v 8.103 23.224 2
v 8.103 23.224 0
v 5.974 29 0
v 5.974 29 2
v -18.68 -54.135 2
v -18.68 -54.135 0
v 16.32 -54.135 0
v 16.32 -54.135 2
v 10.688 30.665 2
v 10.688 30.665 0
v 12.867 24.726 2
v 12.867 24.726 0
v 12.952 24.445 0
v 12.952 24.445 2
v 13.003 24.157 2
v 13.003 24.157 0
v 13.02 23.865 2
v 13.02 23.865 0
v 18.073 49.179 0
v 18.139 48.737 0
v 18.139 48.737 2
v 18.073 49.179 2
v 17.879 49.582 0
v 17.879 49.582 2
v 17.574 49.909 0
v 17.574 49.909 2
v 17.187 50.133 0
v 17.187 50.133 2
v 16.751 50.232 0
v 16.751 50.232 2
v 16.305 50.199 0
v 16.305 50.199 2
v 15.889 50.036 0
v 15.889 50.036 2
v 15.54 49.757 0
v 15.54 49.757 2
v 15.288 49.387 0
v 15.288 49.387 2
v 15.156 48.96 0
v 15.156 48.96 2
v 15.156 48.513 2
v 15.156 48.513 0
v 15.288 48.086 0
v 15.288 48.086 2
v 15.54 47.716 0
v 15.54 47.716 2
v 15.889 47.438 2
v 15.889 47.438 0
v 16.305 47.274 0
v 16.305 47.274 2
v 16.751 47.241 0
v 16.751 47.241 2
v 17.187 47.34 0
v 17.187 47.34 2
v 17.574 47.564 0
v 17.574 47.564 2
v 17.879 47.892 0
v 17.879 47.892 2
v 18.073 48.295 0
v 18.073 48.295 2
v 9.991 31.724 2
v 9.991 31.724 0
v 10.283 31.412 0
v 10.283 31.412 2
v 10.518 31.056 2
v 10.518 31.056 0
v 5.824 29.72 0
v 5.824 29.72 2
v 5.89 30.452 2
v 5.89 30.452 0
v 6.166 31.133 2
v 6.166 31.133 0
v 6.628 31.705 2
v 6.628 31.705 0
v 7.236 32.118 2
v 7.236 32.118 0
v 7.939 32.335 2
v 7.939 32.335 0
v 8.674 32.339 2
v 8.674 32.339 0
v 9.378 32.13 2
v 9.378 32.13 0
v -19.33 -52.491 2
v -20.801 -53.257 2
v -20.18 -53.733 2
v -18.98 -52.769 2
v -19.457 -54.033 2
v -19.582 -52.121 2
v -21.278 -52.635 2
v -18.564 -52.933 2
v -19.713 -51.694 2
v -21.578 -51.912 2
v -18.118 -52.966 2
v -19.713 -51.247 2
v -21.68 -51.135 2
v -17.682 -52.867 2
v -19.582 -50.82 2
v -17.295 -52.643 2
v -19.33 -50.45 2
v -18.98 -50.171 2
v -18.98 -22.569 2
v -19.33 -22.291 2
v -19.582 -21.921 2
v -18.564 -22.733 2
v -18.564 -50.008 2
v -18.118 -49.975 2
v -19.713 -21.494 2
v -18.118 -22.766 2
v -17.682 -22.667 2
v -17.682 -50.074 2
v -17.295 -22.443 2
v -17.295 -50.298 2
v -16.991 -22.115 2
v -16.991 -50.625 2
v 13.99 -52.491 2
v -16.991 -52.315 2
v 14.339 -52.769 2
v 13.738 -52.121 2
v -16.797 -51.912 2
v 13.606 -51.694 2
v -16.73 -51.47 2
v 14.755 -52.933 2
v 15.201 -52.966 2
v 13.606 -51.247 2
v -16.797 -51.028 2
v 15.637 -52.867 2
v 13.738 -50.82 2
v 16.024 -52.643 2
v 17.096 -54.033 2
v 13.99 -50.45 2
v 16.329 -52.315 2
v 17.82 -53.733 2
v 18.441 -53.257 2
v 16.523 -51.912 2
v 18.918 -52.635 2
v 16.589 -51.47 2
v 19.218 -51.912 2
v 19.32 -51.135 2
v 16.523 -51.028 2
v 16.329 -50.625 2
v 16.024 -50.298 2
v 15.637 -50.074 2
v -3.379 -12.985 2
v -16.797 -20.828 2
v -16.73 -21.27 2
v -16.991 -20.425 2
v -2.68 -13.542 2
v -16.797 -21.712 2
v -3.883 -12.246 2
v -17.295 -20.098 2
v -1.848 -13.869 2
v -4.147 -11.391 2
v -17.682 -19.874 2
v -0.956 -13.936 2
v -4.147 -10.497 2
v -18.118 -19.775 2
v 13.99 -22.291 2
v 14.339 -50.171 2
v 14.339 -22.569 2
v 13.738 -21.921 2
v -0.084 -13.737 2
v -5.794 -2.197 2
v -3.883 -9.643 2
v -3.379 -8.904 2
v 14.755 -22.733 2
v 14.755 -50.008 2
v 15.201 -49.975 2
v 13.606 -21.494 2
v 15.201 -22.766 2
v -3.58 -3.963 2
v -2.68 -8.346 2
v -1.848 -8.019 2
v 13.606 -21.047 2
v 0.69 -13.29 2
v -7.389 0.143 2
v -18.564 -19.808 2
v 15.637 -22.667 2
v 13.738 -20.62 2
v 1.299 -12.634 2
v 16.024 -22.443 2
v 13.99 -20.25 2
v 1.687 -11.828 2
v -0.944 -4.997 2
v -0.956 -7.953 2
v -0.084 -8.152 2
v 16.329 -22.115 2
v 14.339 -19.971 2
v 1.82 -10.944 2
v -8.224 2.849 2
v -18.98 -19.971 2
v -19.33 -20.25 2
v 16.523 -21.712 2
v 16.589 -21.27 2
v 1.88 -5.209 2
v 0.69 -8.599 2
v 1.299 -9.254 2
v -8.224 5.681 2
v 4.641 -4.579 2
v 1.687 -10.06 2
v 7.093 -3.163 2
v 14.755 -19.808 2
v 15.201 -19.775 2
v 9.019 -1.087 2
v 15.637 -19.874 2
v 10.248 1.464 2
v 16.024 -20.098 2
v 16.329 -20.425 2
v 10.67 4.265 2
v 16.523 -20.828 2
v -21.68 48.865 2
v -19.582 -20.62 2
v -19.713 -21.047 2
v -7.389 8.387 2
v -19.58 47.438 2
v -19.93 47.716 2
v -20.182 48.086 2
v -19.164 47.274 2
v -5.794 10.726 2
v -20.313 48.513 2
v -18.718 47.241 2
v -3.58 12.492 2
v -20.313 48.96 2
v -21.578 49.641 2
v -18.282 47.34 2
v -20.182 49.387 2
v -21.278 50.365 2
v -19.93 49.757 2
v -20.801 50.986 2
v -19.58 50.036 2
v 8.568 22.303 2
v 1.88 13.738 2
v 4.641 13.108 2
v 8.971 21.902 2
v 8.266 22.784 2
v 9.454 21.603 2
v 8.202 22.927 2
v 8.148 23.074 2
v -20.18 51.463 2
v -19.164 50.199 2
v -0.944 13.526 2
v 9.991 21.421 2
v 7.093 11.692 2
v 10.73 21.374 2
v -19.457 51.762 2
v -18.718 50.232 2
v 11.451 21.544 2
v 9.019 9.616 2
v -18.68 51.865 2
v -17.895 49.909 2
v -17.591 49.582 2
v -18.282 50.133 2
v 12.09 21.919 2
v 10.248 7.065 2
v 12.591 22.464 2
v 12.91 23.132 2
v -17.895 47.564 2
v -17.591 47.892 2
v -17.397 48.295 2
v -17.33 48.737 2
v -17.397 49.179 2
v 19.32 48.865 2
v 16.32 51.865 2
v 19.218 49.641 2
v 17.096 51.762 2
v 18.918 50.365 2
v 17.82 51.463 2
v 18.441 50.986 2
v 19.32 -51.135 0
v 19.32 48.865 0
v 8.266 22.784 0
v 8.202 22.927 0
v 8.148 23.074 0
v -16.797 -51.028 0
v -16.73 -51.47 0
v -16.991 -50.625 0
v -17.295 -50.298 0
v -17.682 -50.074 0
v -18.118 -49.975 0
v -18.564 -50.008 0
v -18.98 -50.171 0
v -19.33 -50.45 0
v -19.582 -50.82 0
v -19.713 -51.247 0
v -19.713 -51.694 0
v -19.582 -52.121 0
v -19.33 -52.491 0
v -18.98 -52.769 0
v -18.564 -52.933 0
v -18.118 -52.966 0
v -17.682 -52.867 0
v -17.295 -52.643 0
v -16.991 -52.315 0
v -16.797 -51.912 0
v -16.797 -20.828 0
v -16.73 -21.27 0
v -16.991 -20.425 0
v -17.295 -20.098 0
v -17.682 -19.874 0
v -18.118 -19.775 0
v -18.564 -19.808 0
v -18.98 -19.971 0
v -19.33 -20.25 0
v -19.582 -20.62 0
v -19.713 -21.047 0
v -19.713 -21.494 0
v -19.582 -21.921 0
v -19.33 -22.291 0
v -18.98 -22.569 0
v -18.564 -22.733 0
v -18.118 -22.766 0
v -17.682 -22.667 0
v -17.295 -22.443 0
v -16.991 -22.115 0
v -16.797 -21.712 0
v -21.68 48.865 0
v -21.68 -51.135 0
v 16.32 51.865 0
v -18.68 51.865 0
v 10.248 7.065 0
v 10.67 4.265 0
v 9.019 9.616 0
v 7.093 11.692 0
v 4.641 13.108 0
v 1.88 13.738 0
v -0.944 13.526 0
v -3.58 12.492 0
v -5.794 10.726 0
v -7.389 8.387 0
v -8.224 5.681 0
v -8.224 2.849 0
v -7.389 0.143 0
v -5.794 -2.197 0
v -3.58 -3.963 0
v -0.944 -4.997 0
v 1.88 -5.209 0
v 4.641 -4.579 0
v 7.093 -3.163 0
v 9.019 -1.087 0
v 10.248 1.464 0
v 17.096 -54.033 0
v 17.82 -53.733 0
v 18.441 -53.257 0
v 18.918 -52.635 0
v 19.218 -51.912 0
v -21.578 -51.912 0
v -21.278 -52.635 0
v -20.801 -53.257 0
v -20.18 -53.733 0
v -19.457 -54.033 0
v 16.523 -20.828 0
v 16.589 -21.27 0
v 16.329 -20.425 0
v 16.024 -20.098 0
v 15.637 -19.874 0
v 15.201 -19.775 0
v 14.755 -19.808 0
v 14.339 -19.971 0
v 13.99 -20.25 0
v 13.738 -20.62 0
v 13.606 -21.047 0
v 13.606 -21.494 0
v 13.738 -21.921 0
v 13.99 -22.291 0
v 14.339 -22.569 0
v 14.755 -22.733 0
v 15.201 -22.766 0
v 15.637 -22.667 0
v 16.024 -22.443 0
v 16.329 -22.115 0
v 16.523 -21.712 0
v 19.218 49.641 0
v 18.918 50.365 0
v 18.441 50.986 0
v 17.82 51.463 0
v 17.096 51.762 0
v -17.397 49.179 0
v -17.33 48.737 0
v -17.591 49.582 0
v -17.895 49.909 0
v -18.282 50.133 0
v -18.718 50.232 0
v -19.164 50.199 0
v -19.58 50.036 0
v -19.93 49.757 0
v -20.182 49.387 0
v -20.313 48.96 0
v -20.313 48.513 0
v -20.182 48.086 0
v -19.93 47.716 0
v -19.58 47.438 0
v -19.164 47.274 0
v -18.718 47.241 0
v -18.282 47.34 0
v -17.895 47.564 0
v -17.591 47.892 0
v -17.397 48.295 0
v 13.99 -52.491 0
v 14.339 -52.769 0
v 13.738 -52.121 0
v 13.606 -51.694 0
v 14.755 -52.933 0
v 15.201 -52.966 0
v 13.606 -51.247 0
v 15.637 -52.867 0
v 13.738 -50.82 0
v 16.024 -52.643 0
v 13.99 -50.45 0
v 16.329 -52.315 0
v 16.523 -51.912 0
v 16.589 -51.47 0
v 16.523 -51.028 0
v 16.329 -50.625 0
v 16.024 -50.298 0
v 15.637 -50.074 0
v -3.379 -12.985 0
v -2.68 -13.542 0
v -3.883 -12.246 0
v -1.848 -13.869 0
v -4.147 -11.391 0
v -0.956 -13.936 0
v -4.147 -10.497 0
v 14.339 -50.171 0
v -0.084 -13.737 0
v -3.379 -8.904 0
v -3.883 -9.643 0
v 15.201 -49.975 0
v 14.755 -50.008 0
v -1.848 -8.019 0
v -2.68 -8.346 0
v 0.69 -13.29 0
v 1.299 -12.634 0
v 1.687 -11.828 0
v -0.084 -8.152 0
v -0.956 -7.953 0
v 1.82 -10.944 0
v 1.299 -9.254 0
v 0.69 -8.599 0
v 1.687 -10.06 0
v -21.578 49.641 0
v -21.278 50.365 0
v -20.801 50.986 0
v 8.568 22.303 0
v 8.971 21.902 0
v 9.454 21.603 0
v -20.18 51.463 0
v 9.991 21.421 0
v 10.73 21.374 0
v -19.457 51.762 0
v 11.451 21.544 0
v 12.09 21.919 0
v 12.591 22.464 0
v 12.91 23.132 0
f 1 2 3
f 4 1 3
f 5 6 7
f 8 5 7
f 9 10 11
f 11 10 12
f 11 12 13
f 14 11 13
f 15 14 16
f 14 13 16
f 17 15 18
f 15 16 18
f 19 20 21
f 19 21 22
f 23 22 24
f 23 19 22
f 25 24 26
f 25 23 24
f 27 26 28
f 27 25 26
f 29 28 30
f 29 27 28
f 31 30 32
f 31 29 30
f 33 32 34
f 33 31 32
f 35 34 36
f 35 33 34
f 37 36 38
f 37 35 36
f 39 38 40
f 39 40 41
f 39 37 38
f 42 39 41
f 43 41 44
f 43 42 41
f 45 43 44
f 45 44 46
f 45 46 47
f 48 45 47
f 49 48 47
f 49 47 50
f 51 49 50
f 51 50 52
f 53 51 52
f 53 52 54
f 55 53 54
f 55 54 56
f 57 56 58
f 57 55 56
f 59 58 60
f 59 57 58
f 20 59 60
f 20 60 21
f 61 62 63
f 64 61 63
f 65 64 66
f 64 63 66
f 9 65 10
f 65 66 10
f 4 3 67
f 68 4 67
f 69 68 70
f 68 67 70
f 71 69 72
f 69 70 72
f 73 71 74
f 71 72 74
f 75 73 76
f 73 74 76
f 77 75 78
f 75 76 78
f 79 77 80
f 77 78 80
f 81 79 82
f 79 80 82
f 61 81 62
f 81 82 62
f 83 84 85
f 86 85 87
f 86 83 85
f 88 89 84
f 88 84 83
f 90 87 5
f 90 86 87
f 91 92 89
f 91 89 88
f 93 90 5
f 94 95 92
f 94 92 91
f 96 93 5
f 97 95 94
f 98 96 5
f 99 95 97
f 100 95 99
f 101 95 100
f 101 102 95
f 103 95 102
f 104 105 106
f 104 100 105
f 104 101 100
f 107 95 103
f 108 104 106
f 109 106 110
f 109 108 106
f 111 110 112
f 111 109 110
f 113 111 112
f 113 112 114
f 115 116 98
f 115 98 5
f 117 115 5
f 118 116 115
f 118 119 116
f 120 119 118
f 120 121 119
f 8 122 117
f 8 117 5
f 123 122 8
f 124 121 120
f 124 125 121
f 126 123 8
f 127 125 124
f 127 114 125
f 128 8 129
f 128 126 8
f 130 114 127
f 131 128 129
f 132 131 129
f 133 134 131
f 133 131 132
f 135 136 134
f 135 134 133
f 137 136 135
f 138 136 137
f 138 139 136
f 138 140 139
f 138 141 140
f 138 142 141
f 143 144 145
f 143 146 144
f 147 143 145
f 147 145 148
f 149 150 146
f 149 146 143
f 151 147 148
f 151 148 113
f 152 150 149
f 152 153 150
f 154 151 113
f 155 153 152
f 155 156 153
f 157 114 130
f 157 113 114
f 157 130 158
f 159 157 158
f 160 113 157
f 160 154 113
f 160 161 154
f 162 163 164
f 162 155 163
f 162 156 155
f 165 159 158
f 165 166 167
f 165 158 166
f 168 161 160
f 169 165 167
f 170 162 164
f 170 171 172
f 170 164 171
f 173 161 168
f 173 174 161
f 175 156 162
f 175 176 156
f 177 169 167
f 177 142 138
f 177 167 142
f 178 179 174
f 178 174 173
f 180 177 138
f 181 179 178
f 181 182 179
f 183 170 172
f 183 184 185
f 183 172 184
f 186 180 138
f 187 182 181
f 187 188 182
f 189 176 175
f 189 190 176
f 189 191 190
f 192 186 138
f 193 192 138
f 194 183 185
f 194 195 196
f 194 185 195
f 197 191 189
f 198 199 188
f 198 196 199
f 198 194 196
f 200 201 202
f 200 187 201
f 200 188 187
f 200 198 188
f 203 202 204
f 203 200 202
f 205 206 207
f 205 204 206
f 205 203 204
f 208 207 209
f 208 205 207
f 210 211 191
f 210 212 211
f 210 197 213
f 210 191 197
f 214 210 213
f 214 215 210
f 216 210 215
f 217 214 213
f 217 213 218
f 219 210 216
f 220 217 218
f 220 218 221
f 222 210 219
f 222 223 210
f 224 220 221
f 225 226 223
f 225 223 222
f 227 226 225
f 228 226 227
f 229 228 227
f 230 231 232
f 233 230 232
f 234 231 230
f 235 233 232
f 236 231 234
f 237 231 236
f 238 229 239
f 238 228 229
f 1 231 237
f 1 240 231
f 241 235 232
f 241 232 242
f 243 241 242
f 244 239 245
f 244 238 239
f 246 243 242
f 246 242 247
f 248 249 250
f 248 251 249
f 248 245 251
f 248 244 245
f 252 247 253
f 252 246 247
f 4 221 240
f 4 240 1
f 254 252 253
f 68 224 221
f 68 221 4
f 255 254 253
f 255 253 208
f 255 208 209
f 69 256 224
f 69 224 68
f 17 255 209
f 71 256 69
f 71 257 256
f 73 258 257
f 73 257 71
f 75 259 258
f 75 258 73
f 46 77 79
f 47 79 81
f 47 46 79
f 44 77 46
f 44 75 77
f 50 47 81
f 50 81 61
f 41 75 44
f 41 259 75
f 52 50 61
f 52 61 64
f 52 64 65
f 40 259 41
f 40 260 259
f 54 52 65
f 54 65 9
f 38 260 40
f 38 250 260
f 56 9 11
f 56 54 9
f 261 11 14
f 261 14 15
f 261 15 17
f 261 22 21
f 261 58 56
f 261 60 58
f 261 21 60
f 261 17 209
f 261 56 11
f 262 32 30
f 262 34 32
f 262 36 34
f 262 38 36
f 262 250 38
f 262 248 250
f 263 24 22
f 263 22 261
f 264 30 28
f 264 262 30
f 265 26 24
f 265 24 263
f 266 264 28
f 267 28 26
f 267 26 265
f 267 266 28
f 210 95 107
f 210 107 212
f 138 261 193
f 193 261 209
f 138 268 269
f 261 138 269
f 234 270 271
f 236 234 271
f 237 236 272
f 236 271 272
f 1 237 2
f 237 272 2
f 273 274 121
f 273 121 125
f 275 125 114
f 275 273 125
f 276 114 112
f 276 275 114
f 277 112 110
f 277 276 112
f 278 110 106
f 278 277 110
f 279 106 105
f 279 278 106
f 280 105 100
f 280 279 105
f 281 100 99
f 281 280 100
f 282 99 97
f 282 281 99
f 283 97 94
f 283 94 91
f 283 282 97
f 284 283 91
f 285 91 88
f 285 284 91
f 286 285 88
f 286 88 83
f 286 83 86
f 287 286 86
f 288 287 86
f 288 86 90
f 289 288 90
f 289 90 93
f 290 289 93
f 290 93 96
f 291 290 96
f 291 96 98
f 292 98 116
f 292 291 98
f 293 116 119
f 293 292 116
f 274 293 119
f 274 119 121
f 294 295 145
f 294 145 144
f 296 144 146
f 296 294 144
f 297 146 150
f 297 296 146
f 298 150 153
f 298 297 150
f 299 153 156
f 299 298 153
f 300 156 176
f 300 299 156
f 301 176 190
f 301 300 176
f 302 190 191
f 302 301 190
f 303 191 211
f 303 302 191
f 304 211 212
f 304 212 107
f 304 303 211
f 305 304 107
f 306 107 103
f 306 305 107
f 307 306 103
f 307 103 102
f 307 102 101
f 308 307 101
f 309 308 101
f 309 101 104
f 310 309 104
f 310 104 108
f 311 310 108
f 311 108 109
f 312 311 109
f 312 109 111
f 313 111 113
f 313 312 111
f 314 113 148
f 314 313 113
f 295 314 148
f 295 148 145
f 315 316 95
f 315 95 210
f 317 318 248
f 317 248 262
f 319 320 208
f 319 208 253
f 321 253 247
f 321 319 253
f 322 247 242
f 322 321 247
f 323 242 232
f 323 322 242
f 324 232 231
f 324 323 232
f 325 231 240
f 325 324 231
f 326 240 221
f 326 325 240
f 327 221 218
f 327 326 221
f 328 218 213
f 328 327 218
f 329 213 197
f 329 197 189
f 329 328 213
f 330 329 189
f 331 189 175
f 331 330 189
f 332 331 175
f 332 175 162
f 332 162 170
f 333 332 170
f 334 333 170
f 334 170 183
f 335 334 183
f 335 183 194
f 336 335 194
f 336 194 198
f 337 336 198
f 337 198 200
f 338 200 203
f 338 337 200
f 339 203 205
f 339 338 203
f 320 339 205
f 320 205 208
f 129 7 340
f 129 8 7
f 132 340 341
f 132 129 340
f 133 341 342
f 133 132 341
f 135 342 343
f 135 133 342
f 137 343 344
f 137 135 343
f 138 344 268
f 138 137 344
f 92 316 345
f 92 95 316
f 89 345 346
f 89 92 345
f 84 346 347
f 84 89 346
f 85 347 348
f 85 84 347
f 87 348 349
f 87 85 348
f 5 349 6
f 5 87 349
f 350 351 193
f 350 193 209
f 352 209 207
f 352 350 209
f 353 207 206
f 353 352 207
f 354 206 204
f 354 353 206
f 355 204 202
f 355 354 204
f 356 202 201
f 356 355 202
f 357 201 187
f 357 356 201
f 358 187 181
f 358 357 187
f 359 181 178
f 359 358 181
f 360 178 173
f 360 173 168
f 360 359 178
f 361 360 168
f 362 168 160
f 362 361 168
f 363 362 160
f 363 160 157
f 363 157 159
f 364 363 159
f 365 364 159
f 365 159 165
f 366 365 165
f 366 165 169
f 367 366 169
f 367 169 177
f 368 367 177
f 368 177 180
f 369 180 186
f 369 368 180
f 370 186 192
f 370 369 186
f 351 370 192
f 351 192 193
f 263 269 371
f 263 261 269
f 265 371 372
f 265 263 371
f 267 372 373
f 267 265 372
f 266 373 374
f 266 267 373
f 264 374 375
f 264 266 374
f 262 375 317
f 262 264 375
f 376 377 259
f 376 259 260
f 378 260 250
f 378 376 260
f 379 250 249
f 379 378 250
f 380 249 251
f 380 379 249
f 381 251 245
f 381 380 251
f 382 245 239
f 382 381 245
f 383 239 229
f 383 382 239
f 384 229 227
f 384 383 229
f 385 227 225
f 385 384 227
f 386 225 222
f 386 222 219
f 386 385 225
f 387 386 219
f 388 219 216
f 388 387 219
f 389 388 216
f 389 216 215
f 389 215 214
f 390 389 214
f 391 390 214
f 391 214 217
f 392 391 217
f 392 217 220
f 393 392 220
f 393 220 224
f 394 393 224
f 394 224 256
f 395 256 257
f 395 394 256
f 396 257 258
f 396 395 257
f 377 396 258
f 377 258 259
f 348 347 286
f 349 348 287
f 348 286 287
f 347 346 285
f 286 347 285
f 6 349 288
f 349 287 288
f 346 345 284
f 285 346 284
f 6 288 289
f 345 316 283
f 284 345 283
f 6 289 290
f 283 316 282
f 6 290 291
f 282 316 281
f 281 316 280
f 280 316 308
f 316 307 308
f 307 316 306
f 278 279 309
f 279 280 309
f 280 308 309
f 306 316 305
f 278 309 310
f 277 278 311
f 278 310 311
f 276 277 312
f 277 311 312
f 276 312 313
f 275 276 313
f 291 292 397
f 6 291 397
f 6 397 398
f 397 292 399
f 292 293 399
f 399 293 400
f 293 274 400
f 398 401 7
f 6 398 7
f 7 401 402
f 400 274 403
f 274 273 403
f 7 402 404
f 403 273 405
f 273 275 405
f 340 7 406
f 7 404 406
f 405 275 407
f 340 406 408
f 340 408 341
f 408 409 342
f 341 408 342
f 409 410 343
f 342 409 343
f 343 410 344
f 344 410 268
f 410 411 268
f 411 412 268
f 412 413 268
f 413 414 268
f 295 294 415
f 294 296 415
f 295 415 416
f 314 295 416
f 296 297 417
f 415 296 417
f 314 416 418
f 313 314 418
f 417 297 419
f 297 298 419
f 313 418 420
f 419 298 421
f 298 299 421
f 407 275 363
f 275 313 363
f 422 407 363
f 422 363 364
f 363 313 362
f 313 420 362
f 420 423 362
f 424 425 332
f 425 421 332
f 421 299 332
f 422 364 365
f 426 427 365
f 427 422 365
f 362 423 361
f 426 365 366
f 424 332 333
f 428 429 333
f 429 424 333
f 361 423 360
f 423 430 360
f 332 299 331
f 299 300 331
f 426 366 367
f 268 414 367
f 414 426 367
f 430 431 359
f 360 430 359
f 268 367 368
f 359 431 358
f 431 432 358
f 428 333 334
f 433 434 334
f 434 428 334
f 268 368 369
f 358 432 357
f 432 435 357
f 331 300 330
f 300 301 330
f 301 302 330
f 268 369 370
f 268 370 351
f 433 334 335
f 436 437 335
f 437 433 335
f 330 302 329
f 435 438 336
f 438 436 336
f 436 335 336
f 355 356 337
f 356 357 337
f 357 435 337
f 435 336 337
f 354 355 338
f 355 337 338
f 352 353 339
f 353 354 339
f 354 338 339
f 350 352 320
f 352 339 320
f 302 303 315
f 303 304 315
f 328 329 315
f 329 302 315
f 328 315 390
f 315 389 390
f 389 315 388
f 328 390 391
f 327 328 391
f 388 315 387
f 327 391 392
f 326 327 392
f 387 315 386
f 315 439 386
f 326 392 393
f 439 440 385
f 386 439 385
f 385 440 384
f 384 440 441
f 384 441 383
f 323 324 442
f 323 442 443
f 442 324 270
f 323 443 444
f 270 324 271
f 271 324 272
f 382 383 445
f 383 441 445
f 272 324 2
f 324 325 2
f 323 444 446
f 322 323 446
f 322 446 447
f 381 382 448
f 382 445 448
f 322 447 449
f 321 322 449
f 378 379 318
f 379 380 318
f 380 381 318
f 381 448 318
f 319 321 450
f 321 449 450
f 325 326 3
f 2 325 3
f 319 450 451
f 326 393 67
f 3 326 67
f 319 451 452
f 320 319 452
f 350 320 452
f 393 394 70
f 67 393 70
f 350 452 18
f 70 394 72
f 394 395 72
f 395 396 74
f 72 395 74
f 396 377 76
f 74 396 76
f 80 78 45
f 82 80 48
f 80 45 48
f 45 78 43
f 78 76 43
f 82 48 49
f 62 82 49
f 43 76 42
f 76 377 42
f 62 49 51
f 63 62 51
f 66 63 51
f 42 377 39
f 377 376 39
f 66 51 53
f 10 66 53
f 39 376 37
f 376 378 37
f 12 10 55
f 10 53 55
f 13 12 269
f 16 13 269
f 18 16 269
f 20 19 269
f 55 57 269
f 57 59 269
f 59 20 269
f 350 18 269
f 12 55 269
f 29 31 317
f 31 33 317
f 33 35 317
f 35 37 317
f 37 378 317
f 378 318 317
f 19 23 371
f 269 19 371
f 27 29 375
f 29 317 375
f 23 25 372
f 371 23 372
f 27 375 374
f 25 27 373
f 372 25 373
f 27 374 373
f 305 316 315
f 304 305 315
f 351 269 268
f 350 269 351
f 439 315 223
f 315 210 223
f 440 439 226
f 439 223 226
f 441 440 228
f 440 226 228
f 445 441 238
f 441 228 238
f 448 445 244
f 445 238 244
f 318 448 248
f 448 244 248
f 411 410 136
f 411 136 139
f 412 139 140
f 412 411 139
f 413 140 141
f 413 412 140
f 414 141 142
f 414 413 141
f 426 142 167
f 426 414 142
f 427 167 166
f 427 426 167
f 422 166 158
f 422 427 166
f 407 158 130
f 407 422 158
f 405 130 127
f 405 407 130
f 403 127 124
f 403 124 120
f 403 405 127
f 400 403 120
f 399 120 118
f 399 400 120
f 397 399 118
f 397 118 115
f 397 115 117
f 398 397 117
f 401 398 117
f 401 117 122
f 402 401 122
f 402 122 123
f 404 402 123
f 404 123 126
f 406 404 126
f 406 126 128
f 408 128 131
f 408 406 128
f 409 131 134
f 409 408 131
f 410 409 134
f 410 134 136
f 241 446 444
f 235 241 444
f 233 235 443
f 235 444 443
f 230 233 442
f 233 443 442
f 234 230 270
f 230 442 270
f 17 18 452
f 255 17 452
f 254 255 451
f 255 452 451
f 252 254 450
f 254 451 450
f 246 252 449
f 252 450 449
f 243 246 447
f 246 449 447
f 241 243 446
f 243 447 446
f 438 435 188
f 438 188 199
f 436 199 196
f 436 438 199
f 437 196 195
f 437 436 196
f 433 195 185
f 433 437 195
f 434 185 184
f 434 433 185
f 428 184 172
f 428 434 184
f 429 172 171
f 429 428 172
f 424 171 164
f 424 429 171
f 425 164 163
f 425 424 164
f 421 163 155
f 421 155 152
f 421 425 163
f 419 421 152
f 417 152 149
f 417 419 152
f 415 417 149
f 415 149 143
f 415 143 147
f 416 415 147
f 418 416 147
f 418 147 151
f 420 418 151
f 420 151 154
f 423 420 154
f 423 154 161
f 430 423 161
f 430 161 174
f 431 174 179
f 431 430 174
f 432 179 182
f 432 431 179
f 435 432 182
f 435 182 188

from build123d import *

# Parameters (mm, degrees)
F0_W     = 41
F0_H     = 106
F0_R     = 1.5
F0_R_2   = 5.05
F0_R_3   = 2
F0_R_4   = 3
F0_R_5   = 9.5
F1_DEPTH = 2
F2_R     = 3


# Not quite as in the source:
# - a feature names something its author has since deleted; it is built from what else it names


with BuildPart() as f1:
    # F0 (on Top) → F1 (new body)
    with BuildSketch(Plane.XY):
        with Locations((-1.1801278293, -1.1353523731)):
            Rectangle(F0_W, F0_H)
        with Locations((-18.2301278293, -51.4703523731)):
            Circle(F0_R, mode=Mode.SUBTRACT)
        with Locations((-6.776117335, -33.481924504)):
            Circle(F0_R_2, mode=Mode.SUBTRACT)
        with Locations((-18.2301278293, -21.2703523731)):
            Circle(F0_R, mode=Mode.SUBTRACT)
        with Locations((-11.8353097141, -18.4490393624)):
            Circle(F0_R_3, mode=Mode.SUBTRACT)
        with BuildLine():
            ThreePointArc((0.9913514778, -28.481924504), (-4.9415118708, -25.855220261), (-8.0481067447, -20.1589485871))
            Line((-8.0481067447, -20.1589485871), (9.9913514778, -20.516399593))
            Line((9.9913514778, -20.516399593), (9.9913514778, -46.516399593))
            Line((9.9913514778, -46.516399593), (-8.0481067447, -46.804900421))
            ThreePointArc((-8.0481067447, -46.804900421), (-4.9415118708, -41.1086287471), (0.9913514778, -38.481924504))
            Line((0.9913514778, -38.481924504), (0.9913514778, -28.481924504))
        make_face(mode=Mode.SUBTRACT)
        with Locations((15.0892422113, -51.4703523731)):
            Circle(F0_R, mode=Mode.SUBTRACT)
        with Locations((-1.1801278293, -10.9442314133)):
            Circle(F0_R_4, mode=Mode.SUBTRACT)
        with Locations((15.0892422113, -21.2703523731)):
            Circle(F0_R, mode=Mode.SUBTRACT)
        with Locations((-11.8353097141, -0.1353523731)):
            Circle(F0_R_3, mode=Mode.SUBTRACT)
        with Locations((-11.8353097141, 18.1783346161)):
            Circle(F0_R_3, mode=Mode.SUBTRACT)
        with Locations((-18.8301271707, 48.7366476269)):
            Circle(F0_R, mode=Mode.SUBTRACT)
        with Locations((-6.776117335, 33.2112197578)):
            Circle(F0_R_2, mode=Mode.SUBTRACT)
        with Locations((1.1698721707, 4.2646476269)):
            Circle(F0_R_5, mode=Mode.SUBTRACT)
        with BuildLine():
            ThreePointArc((0.9913514778, 38.2112197578), (-4.9415118708, 40.8379240009), (-8.0481067447, 46.5341956747))
            Line((-8.0481067447, 46.5341956747), (9.9913514778, 46.2456948468))
            Line((9.9913514778, 46.2456948468), (9.9913514778, 31.7237218389))
            ThreePointArc((9.9913514778, 31.7237218389), (10.4081379557, 31.2391097076), (10.6884153726, 30.6646495649))
            Line((10.6884153726, 30.6646495649), (12.8669505005, 24.7255908967))
            ThreePointArc((12.8669505005, 24.7255908967), (12.9813448828, 24.3018570593), (13.0198721707, 23.8646476269))
            ThreePointArc((13.0198721707, 23.8646476269), (12.0896967258, 21.9189727141), (9.9913514778, 21.4211530234))
            Line((9.9913514778, 21.4211530234), (9.9913514778, 20.2456948468))
            Line((9.9913514778, 20.2456948468), (-8.0481067447, 19.8882438409))
            ThreePointArc((-8.0481067447, 19.8882438409), (-4.9415118708, 25.5845155147), (0.9913514778, 28.2112197578))
            Line((0.9913514778, 28.2112197578), (0.9913514778, 38.2112197578))
        make_face(mode=Mode.SUBTRACT)
        with Locations((16.6392421771, 48.7366476269)):
            Circle(F0_R, mode=Mode.SUBTRACT)
        with BuildLine():
            Line((9.9913514778, -20.516399593), (-8.0481067447, -20.1589485871))
            ThreePointArc((-8.0481067447, -20.1589485871), (-4.9415118708, -25.855220261), (0.9913514778, -28.481924504))
            Line((0.9913514778, -28.481924504), (0.9913514778, -38.481924504))
            ThreePointArc((0.9913514778, -38.481924504), (-4.9415118708, -41.1086287471), (-8.0481067447, -46.804900421))
            Line((-8.0481067447, -46.804900421), (9.9913514778, -46.516399593))
            Line((9.9913514778, -46.516399593), (9.9913514778, -20.516399593))
        make_face()
        with Locations((-2.2937730764, -41.981924504)):
            Circle(F0_R, mode=Mode.SUBTRACT)
        with Locations((-2.2937730764, -24.981924504)):
            Circle(F0_R, mode=Mode.SUBTRACT)
        with BuildLine():
            Line((9.9913514778, 46.2456948468), (-8.0481067447, 46.5341956747))
            ThreePointArc((-8.0481067447, 46.5341956747), (-4.9415118708, 40.8379240009), (0.9913514778, 38.2112197578))
            Line((0.9913514778, 38.2112197578), (0.9913514778, 28.2112197578))
            ThreePointArc((0.9913514778, 28.2112197578), (-4.9415118708, 25.5845155147), (-8.0481067447, 19.8882438409))
            Line((-8.0481067447, 19.8882438409), (9.9913514778, 20.2456948468))
            Line((9.9913514778, 20.2456948468), (9.9913514778, 21.4211530234))
            ThreePointArc((9.9913514778, 21.4211530234), (8.9707387909, 21.9024586015), (8.2657292668, 22.7835186943))
            ThreePointArc((8.2657292668, 22.7835186943), (8.1741724057, 22.9999554201), (8.1033430916, 23.2240329142))
            Line((8.1033430916, 23.2240329142), (5.9741724057, 28.9999554201))
            ThreePointArc((5.9741724057, 28.9999554201), (6.9168863609, 31.9338578186), (9.9913514778, 31.7237218389))
            Line((9.9913514778, 31.7237218389), (9.9913514778, 46.2456948468))
        make_face()
        with Locations((-2.2937730764, 24.7112197578)):
            Circle(F0_R, mode=Mode.SUBTRACT)
        with Locations((-2.2937730764, 41.7112197578)):
            Circle(F0_R, mode=Mode.SUBTRACT)
        with Locations((-6.776117335, 33.2112197578)):
            Circle(F0_R_2)
        with Locations((-6.776117335, -33.481924504)):
            Circle(F0_R_2)
        with Locations((-11.8353097141, -18.4490393624)):
            Circle(F0_R_3)
        with Locations((-11.8353097141, -0.1353523731)):
            Circle(F0_R_3)
        with Locations((-11.8353097141, 18.1783346161)):
            Circle(F0_R_3)
        with Locations((-2.2937730764, -24.981924504)):
            Circle(F0_R)
        with Locations((-2.2937730764, -41.981924504)):
            Circle(F0_R)
        with Locations((-2.2937730764, 24.7112197578)):
            Circle(F0_R)
        with Locations((-2.2937730764, 41.7112197578)):
            Circle(F0_R)
    extrude(amount=F1_DEPTH)

    # F2
    f2_edges = [f1.edges().sort_by_distance(p)[0] for p in [
        (-21.680128, 51.864648, 1),
        (-21.680128, -54.135352, 1),
        (19.319872, -54.135352, 1),
        (19.319872, 51.864648, 1),
    ]]
    fillet(f2_edges, radius=F2_R)


solid = f1.part
